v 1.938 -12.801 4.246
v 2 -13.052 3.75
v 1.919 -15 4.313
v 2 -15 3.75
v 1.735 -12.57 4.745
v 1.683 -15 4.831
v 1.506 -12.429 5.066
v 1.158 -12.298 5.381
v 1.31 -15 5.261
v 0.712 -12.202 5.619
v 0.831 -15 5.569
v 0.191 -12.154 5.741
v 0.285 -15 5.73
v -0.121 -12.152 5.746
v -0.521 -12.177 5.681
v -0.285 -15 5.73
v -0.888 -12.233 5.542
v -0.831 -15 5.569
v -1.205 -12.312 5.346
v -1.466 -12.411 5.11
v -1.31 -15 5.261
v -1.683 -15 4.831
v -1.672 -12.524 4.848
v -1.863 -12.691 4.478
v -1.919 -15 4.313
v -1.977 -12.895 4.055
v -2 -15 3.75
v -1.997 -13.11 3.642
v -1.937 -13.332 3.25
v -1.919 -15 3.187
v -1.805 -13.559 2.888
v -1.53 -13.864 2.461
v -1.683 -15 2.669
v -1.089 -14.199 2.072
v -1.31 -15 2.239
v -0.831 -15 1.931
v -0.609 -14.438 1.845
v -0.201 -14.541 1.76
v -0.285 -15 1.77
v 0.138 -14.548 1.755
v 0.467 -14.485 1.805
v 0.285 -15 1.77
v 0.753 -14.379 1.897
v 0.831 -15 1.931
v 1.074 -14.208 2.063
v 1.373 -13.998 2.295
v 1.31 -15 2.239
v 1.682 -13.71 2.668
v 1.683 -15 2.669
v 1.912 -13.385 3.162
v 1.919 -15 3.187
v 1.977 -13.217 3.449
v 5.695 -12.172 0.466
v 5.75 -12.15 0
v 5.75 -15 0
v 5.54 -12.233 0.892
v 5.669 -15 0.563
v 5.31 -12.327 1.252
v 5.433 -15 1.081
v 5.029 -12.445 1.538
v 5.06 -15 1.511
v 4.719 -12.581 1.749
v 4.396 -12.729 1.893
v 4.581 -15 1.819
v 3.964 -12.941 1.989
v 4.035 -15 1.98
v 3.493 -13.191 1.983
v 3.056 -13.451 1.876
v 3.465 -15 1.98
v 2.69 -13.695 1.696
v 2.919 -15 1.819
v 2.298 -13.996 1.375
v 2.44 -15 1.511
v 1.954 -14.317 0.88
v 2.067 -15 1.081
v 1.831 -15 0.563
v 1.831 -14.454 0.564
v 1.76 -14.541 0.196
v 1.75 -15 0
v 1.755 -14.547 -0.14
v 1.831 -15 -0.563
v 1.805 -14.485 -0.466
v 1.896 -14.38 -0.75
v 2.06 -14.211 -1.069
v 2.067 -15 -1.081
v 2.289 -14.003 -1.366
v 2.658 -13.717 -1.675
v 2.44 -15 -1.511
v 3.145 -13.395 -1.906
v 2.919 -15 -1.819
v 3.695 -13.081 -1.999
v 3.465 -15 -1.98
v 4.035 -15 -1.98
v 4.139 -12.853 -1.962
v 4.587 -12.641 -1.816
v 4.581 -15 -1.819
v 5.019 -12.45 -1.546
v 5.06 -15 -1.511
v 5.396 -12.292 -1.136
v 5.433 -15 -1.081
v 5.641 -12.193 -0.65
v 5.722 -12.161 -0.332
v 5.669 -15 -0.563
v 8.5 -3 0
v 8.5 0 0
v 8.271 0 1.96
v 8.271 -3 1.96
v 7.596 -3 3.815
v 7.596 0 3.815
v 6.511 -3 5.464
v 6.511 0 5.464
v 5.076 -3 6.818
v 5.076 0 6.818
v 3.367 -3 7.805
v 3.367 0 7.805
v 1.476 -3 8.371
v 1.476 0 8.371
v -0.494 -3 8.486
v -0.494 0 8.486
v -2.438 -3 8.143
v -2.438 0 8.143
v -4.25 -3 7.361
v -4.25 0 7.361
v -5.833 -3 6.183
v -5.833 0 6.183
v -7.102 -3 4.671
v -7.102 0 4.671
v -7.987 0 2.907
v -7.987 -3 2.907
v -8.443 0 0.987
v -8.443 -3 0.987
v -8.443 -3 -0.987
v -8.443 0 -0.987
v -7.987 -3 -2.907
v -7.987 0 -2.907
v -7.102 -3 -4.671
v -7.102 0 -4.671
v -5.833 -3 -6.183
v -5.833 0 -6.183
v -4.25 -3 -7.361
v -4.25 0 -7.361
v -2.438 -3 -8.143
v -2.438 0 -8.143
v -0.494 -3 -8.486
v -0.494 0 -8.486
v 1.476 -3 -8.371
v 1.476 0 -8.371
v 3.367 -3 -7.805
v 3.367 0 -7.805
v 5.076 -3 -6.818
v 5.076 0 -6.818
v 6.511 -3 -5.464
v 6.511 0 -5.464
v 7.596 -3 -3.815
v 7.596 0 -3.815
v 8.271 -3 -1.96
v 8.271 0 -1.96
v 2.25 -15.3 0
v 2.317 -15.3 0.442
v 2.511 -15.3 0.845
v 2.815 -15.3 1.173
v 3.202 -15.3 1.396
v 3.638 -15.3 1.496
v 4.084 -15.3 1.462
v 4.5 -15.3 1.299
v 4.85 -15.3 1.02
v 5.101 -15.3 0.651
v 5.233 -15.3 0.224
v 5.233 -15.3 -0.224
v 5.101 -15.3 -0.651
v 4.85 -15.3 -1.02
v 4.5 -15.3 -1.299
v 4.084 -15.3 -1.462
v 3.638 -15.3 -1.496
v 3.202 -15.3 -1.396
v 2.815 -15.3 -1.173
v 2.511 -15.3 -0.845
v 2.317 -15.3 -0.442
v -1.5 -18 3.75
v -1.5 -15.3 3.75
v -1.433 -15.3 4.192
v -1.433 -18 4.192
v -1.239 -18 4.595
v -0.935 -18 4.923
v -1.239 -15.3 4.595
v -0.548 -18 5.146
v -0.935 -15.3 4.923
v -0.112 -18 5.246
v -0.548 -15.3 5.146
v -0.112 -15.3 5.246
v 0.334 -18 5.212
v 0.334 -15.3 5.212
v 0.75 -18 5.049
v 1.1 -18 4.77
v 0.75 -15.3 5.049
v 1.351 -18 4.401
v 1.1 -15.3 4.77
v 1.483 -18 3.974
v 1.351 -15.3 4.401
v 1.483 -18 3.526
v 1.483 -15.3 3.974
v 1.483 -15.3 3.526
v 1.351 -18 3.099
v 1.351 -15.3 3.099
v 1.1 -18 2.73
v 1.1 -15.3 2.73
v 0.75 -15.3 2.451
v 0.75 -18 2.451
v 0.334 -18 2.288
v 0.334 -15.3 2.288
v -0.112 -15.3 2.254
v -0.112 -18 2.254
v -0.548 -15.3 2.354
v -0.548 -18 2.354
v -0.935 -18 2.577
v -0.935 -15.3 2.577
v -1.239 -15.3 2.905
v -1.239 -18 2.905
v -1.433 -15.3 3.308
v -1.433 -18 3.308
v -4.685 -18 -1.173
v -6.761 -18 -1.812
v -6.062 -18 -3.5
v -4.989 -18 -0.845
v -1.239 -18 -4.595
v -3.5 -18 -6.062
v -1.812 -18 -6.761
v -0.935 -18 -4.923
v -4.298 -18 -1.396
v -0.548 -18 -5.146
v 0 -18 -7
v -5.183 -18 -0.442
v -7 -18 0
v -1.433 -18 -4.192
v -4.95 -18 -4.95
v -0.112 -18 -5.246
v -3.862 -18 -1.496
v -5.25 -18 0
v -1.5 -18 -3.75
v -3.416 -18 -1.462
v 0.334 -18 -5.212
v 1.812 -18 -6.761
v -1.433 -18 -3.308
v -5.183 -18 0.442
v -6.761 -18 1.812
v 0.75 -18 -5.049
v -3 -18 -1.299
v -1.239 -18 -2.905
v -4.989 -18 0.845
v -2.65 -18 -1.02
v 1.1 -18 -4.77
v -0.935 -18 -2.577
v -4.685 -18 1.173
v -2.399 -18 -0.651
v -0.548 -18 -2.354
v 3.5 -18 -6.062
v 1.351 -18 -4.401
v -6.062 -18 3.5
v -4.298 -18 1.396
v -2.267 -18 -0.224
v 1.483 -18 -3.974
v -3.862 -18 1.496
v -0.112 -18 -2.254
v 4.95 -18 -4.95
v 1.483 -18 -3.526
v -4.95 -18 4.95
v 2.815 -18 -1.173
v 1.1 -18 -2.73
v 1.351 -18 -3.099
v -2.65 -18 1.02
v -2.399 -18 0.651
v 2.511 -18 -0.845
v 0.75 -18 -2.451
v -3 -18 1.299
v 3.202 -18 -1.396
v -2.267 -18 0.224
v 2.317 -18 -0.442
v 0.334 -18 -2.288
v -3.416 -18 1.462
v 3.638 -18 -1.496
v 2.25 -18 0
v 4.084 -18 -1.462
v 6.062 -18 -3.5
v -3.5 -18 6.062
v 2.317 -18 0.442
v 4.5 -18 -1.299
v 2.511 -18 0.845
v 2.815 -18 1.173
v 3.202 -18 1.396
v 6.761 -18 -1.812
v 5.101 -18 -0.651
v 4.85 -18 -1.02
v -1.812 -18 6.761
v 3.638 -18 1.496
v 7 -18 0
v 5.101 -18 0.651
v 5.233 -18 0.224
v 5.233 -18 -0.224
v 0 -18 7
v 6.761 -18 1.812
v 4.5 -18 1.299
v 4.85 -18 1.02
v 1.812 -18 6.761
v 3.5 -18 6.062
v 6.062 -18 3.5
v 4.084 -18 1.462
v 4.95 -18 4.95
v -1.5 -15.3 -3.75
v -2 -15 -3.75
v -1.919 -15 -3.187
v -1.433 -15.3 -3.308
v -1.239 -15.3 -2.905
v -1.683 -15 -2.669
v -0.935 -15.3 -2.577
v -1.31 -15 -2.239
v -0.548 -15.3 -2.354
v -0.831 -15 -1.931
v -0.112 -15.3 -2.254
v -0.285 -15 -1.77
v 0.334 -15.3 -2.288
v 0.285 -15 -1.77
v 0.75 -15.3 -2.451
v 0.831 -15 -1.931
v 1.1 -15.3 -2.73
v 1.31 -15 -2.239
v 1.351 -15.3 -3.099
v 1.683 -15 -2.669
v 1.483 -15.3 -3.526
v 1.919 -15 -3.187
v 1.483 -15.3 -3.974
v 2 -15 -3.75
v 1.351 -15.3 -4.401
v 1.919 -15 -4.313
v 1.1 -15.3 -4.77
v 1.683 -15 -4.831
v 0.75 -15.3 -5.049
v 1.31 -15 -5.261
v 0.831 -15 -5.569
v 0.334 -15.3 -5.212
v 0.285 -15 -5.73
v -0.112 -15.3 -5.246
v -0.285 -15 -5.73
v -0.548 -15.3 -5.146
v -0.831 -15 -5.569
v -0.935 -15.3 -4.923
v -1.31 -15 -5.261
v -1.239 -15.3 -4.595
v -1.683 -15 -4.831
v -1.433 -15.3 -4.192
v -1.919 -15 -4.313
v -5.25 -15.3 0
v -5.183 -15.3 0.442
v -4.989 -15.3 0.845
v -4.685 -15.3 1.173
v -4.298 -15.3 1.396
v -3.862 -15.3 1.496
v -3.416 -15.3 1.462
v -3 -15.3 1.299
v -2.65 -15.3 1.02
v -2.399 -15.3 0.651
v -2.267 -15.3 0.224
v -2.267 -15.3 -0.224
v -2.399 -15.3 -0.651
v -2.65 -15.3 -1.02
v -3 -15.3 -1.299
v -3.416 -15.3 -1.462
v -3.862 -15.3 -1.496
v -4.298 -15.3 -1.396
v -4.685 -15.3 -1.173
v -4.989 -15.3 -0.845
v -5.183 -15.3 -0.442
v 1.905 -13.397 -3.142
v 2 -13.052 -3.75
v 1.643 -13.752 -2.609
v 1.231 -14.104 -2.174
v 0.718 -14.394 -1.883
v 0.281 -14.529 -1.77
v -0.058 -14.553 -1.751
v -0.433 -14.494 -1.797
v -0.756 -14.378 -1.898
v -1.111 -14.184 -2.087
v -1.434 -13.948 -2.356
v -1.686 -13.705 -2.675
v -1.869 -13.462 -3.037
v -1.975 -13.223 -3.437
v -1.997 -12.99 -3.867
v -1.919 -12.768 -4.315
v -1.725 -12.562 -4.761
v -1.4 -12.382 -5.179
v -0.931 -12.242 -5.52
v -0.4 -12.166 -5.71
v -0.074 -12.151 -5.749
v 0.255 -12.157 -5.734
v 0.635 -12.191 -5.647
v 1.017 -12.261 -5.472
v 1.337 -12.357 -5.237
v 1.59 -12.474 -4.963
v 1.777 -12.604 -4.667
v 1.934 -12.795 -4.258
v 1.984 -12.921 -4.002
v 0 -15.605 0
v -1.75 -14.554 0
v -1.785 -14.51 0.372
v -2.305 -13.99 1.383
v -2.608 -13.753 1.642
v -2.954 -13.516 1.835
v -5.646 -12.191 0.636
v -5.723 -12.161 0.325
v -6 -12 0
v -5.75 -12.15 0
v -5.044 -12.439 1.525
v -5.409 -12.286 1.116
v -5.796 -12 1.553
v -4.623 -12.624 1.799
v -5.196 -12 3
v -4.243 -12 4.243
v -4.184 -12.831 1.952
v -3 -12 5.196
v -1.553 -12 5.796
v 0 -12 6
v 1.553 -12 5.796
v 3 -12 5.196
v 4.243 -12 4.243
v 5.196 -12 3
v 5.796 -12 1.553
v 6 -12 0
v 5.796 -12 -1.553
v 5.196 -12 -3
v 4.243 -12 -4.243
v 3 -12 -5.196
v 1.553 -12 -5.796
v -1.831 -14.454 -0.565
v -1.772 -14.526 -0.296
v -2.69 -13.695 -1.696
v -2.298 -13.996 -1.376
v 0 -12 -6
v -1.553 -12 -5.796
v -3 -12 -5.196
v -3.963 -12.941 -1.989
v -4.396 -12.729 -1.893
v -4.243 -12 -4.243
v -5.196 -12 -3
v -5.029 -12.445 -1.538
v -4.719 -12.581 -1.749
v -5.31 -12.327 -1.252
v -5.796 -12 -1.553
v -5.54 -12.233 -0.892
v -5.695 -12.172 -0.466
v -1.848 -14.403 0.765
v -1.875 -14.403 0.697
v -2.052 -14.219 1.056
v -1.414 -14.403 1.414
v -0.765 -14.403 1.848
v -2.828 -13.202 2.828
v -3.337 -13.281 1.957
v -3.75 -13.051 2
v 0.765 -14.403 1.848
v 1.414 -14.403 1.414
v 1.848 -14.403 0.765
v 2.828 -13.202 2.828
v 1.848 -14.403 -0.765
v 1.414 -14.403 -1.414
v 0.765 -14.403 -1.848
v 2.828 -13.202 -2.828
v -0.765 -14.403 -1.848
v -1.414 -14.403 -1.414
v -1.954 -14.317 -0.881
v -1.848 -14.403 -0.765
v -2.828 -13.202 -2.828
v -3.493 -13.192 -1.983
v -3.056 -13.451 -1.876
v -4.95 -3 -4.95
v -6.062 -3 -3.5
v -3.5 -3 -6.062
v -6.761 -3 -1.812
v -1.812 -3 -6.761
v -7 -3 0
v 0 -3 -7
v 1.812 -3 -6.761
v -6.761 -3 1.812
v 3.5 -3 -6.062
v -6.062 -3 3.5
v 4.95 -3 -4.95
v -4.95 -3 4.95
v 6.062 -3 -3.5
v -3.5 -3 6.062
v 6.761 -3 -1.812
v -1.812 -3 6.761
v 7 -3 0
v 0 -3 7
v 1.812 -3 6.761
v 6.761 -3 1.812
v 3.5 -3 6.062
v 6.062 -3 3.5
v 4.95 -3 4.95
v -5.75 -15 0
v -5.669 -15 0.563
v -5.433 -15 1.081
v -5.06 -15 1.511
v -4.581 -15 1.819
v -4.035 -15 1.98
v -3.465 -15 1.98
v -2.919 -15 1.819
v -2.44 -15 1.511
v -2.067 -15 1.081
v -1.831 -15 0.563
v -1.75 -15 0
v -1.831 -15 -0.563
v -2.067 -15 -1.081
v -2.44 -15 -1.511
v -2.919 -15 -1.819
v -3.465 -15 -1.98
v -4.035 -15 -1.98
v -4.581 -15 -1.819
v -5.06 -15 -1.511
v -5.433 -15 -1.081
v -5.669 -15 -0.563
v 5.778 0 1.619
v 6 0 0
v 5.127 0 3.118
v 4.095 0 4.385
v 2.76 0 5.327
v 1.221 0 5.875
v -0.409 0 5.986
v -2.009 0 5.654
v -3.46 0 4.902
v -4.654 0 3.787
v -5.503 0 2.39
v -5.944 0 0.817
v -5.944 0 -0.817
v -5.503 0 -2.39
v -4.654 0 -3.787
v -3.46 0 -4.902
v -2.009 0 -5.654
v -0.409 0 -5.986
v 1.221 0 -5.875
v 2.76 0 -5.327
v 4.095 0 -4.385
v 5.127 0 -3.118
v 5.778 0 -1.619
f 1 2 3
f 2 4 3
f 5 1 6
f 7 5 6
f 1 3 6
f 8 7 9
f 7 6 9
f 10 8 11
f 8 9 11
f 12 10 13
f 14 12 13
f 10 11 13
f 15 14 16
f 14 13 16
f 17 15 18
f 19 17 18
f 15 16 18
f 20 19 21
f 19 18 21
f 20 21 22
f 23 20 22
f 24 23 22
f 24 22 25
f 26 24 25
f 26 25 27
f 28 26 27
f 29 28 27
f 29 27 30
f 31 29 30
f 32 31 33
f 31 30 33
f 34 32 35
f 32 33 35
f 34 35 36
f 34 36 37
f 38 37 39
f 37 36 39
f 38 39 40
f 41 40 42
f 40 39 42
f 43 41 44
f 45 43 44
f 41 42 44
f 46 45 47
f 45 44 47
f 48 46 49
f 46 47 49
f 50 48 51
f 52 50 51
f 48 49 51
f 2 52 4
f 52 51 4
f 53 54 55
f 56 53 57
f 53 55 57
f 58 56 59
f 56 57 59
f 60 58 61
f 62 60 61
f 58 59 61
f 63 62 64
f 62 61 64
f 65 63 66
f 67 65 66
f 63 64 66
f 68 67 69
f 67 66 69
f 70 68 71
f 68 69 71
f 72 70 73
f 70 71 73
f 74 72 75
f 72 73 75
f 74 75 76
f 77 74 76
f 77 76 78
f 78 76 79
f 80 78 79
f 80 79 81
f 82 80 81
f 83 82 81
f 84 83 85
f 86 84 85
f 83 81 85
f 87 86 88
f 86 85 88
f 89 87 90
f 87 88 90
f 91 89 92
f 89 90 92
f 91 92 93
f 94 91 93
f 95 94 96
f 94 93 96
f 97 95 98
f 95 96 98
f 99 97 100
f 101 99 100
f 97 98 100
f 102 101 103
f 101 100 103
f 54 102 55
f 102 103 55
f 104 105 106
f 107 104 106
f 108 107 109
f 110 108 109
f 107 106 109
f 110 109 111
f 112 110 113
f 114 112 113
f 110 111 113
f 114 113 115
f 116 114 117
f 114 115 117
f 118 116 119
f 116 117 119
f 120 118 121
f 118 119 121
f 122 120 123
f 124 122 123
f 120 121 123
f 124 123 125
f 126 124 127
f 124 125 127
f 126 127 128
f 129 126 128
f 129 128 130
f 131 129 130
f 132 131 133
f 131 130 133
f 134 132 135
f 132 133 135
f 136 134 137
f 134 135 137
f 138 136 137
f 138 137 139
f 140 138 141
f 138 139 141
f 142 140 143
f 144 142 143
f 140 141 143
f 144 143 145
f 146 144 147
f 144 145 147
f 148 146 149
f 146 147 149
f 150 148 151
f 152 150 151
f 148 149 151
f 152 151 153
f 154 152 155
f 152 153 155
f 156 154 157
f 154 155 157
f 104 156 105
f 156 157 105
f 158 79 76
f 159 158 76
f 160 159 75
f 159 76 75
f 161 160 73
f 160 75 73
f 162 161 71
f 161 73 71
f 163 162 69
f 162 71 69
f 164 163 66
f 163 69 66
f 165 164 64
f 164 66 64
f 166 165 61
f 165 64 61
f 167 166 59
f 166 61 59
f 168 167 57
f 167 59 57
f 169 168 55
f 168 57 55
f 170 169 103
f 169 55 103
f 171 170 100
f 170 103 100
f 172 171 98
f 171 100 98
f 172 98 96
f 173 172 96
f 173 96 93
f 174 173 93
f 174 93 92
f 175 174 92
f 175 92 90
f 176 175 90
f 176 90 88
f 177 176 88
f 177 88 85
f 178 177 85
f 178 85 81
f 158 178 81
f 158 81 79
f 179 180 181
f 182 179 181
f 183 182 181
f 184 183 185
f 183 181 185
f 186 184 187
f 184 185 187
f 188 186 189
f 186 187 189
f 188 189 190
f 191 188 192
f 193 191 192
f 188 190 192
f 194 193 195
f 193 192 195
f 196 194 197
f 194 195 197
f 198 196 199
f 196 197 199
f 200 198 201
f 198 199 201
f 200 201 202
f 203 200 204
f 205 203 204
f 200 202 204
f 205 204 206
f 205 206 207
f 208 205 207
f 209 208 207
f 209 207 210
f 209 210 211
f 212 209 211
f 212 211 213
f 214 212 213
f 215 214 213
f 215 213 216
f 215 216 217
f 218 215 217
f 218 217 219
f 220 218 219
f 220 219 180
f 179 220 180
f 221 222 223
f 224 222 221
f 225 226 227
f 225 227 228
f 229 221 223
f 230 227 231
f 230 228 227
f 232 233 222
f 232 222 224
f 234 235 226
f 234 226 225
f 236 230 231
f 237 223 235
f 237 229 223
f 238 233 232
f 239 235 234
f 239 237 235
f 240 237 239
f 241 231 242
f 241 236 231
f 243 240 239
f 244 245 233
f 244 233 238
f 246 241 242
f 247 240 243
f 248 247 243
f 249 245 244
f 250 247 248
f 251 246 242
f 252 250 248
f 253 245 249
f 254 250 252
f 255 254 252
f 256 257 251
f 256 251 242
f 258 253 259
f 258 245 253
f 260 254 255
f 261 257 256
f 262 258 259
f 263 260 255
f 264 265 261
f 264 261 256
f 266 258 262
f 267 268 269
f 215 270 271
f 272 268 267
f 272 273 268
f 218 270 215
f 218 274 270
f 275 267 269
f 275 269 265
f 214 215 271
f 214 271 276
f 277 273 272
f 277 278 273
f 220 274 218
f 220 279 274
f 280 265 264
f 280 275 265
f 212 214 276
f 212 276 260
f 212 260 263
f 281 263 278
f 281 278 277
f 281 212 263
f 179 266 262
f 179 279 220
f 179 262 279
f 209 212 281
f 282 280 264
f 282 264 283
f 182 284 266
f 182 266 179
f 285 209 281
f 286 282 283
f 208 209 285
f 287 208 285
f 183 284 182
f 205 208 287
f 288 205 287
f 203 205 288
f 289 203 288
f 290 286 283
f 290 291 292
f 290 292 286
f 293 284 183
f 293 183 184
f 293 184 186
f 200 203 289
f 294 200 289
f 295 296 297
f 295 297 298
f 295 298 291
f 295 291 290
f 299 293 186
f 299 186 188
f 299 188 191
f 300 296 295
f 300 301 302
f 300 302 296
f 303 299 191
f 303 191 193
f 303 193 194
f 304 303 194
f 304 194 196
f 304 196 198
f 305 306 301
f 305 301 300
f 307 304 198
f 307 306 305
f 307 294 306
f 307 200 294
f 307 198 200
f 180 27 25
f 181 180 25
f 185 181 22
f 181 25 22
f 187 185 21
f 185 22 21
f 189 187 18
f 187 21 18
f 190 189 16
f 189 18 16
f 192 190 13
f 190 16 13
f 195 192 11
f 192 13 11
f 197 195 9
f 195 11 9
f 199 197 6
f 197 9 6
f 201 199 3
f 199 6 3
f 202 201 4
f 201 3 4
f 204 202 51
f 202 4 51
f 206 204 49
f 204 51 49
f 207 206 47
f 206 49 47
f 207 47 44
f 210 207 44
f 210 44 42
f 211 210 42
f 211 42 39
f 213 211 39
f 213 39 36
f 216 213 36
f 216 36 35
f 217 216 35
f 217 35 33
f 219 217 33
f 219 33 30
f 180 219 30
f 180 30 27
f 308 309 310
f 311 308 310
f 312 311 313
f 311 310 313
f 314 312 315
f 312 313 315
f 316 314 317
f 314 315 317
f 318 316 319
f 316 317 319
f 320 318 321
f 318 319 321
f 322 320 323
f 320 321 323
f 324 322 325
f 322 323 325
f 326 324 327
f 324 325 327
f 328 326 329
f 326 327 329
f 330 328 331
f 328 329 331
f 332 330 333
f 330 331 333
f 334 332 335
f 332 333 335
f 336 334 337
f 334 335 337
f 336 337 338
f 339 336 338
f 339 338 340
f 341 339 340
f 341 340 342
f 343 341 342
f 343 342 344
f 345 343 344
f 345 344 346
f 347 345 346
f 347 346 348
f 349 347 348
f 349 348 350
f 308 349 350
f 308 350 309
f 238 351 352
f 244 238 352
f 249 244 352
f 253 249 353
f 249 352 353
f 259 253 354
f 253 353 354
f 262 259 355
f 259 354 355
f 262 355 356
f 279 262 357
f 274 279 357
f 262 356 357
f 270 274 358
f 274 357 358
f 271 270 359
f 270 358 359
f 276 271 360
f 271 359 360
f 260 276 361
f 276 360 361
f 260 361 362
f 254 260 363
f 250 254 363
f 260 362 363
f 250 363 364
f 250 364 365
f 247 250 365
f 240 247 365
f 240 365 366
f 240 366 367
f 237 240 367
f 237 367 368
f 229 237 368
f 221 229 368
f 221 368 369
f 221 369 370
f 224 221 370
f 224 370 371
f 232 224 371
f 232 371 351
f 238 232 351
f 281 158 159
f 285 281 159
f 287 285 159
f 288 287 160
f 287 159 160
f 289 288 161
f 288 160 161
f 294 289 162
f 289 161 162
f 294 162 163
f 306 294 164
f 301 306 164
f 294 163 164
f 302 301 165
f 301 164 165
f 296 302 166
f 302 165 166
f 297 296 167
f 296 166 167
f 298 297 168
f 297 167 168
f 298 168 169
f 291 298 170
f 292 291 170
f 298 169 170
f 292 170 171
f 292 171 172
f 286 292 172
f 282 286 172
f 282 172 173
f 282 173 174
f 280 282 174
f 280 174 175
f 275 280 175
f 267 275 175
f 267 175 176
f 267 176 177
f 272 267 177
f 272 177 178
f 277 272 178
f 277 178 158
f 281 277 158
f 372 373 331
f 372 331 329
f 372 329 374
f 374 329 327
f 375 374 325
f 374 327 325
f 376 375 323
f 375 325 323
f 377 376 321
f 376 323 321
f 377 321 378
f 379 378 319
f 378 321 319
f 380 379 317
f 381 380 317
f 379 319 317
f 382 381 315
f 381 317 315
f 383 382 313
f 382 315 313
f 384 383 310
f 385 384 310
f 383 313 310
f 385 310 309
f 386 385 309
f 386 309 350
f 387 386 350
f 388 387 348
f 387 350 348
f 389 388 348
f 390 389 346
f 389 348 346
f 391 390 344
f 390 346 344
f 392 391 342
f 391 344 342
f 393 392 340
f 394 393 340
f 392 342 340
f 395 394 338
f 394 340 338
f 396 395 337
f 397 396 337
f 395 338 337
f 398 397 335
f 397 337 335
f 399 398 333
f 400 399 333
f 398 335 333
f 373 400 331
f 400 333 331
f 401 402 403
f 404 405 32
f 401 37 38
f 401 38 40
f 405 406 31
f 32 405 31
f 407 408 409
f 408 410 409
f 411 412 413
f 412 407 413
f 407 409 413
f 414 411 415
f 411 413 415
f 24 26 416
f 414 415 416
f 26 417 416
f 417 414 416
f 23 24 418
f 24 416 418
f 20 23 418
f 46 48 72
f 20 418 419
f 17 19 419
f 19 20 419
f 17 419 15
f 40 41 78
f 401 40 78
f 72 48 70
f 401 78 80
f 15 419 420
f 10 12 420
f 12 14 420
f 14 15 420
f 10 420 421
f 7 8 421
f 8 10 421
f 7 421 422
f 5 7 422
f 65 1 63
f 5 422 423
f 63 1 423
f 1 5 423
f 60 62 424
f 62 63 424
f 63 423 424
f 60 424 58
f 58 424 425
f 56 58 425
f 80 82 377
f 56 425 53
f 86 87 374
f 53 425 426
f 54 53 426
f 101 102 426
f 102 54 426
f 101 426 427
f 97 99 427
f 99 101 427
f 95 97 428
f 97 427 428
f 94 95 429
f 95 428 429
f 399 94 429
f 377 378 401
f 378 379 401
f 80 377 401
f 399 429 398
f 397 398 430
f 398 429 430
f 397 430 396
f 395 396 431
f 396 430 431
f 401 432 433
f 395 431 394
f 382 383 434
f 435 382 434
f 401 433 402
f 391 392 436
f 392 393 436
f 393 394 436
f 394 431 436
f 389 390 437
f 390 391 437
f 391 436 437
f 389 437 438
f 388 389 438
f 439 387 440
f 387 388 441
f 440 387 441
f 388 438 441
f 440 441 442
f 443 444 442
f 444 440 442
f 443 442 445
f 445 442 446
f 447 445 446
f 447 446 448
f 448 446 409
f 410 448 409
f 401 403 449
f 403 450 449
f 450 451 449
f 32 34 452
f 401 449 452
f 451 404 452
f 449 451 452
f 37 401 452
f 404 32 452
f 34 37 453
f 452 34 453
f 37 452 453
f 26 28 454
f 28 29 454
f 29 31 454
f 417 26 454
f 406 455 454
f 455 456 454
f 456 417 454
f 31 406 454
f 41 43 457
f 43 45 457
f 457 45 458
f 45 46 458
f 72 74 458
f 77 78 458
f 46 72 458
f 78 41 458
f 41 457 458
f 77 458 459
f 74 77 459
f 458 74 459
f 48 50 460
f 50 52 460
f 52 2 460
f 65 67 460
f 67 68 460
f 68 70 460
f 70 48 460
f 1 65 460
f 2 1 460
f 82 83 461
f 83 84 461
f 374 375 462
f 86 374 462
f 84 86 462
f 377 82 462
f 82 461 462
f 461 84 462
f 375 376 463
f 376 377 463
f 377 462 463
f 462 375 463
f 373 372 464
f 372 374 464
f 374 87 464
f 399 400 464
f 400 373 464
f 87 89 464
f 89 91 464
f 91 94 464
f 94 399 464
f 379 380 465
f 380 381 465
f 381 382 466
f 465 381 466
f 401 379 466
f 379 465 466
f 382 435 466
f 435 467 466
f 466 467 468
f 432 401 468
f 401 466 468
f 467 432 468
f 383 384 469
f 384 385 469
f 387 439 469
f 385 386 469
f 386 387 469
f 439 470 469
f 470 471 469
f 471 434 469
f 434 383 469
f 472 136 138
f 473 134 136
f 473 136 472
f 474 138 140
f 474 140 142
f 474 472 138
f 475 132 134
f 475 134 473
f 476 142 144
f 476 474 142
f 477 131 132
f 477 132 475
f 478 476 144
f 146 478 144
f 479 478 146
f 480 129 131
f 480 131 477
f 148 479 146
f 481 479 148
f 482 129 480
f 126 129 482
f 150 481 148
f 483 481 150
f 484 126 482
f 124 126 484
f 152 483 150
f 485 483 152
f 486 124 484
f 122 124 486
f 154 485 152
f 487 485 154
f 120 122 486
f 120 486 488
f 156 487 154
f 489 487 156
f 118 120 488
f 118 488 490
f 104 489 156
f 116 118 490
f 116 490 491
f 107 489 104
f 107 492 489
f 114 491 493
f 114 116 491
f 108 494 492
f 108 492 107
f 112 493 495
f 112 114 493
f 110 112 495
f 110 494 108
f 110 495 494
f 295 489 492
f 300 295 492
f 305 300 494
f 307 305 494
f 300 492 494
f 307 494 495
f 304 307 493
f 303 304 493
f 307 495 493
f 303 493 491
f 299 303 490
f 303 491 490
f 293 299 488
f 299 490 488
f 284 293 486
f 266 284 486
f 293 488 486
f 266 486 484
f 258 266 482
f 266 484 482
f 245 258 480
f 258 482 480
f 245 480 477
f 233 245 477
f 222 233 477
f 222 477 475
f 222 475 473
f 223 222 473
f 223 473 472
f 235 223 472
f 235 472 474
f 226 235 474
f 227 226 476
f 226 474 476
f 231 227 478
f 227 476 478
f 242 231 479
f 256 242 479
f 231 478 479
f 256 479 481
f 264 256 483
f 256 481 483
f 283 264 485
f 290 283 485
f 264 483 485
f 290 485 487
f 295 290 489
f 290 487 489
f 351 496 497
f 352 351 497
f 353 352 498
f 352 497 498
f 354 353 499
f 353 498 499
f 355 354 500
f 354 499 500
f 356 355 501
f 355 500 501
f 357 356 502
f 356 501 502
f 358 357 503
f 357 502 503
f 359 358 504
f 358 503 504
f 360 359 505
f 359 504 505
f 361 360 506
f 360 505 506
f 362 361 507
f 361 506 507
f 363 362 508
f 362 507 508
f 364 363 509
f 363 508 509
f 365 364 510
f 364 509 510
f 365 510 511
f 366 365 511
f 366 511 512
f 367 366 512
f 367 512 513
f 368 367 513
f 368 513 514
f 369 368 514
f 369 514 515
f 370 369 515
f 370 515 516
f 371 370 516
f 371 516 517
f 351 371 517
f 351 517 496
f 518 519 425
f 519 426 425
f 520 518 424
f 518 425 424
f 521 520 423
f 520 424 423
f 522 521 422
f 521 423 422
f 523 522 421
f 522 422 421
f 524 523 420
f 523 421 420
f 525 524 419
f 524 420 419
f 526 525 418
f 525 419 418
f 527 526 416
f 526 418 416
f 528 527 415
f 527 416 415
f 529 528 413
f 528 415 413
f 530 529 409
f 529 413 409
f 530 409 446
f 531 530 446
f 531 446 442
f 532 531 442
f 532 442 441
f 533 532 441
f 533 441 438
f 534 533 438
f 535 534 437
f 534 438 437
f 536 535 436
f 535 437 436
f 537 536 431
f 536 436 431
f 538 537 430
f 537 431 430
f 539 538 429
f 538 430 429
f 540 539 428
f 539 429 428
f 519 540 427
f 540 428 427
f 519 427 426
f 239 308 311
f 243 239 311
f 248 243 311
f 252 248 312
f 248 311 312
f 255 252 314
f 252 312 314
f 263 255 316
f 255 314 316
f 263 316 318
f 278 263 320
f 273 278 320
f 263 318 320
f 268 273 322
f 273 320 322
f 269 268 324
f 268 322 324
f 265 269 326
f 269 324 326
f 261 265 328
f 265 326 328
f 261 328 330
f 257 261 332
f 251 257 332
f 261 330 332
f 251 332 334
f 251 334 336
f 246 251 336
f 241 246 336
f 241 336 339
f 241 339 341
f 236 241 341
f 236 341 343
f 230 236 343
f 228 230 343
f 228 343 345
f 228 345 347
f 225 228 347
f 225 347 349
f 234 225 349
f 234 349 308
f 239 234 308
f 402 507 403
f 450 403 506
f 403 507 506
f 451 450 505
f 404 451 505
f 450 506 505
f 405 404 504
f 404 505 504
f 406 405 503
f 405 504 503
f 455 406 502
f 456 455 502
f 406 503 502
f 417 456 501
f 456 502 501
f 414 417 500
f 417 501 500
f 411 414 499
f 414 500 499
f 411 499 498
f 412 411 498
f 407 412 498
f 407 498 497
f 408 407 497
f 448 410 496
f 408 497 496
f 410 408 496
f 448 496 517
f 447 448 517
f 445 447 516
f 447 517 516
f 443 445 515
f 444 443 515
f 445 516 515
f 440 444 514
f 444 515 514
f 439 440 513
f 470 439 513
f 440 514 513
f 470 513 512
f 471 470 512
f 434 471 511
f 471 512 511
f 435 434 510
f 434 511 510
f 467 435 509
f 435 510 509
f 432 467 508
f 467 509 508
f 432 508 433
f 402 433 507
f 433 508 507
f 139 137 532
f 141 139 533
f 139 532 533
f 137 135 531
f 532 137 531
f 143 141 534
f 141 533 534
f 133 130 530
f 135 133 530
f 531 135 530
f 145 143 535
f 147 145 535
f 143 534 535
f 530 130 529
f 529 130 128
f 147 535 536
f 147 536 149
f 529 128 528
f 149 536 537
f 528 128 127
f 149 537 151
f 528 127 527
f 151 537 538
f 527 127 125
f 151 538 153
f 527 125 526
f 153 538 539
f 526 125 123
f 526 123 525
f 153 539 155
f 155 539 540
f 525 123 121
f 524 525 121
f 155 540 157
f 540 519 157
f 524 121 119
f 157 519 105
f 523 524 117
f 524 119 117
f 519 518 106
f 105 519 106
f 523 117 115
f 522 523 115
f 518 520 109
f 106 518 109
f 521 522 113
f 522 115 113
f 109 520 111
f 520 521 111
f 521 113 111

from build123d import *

# Parameters (mm, degrees)
F0_R     = 8.5
F1_DEPTH = 3
F2_R     = 7
F3_DEPTH = 15
F5_D     = 3
F7_D     = 12
F7_DEPTH = 12
F7_TIP   = 3.6051637142
F9_D     = 4
F9_DEPTH = 15
F9_TIP   = 1.2017212381


with BuildPart() as f1:
    # F0 (on Front) → F1 (new body)
    with BuildSketch(Plane.XZ):
        Circle(F0_R)
    extrude(amount=F1_DEPTH)

    # F2 (on face) → F3 (join)
    with BuildSketch(Plane.XZ.offset(3)):
        Circle(F2_R)
    extrude(amount=F3_DEPTH)

    # F5 (through all)
    with Locations(Plane.XZ.offset(18)):
        with Locations((0, 3.75), (3.75, 0), (0, -3.75), (-3.75, 0)):
            Hole(F5_D / 2)

    # F7
    with Locations(Plane(origin=(0, 0, 0), x_dir=(-1, 0, 0), z_dir=(0, 1, 0))):
        with Locations((0, 0)):
            Hole(F7_D / 2, depth=F7_DEPTH)
            with Locations((0, 0, -(F7_DEPTH + F7_TIP / 2))):  # 118° drill point
                Cone(0, F7_D / 2, F7_TIP, mode=Mode.SUBTRACT)

    # F9
    with Locations(Plane(origin=(0, 0, 0), x_dir=(-1, 0, 0), z_dir=(0, 1, 0))):
        with Locations((0, 3.75), (-3.75, 0), (3.75, 0), (0, -3.75)):
            Hole(F9_D / 2, depth=F9_DEPTH)
            with Locations((0, 0, -(F9_DEPTH + F9_TIP / 2))):  # 118° drill point
                Cone(0, F9_D / 2, F9_TIP, mode=Mode.SUBTRACT)


solid = f1.part
